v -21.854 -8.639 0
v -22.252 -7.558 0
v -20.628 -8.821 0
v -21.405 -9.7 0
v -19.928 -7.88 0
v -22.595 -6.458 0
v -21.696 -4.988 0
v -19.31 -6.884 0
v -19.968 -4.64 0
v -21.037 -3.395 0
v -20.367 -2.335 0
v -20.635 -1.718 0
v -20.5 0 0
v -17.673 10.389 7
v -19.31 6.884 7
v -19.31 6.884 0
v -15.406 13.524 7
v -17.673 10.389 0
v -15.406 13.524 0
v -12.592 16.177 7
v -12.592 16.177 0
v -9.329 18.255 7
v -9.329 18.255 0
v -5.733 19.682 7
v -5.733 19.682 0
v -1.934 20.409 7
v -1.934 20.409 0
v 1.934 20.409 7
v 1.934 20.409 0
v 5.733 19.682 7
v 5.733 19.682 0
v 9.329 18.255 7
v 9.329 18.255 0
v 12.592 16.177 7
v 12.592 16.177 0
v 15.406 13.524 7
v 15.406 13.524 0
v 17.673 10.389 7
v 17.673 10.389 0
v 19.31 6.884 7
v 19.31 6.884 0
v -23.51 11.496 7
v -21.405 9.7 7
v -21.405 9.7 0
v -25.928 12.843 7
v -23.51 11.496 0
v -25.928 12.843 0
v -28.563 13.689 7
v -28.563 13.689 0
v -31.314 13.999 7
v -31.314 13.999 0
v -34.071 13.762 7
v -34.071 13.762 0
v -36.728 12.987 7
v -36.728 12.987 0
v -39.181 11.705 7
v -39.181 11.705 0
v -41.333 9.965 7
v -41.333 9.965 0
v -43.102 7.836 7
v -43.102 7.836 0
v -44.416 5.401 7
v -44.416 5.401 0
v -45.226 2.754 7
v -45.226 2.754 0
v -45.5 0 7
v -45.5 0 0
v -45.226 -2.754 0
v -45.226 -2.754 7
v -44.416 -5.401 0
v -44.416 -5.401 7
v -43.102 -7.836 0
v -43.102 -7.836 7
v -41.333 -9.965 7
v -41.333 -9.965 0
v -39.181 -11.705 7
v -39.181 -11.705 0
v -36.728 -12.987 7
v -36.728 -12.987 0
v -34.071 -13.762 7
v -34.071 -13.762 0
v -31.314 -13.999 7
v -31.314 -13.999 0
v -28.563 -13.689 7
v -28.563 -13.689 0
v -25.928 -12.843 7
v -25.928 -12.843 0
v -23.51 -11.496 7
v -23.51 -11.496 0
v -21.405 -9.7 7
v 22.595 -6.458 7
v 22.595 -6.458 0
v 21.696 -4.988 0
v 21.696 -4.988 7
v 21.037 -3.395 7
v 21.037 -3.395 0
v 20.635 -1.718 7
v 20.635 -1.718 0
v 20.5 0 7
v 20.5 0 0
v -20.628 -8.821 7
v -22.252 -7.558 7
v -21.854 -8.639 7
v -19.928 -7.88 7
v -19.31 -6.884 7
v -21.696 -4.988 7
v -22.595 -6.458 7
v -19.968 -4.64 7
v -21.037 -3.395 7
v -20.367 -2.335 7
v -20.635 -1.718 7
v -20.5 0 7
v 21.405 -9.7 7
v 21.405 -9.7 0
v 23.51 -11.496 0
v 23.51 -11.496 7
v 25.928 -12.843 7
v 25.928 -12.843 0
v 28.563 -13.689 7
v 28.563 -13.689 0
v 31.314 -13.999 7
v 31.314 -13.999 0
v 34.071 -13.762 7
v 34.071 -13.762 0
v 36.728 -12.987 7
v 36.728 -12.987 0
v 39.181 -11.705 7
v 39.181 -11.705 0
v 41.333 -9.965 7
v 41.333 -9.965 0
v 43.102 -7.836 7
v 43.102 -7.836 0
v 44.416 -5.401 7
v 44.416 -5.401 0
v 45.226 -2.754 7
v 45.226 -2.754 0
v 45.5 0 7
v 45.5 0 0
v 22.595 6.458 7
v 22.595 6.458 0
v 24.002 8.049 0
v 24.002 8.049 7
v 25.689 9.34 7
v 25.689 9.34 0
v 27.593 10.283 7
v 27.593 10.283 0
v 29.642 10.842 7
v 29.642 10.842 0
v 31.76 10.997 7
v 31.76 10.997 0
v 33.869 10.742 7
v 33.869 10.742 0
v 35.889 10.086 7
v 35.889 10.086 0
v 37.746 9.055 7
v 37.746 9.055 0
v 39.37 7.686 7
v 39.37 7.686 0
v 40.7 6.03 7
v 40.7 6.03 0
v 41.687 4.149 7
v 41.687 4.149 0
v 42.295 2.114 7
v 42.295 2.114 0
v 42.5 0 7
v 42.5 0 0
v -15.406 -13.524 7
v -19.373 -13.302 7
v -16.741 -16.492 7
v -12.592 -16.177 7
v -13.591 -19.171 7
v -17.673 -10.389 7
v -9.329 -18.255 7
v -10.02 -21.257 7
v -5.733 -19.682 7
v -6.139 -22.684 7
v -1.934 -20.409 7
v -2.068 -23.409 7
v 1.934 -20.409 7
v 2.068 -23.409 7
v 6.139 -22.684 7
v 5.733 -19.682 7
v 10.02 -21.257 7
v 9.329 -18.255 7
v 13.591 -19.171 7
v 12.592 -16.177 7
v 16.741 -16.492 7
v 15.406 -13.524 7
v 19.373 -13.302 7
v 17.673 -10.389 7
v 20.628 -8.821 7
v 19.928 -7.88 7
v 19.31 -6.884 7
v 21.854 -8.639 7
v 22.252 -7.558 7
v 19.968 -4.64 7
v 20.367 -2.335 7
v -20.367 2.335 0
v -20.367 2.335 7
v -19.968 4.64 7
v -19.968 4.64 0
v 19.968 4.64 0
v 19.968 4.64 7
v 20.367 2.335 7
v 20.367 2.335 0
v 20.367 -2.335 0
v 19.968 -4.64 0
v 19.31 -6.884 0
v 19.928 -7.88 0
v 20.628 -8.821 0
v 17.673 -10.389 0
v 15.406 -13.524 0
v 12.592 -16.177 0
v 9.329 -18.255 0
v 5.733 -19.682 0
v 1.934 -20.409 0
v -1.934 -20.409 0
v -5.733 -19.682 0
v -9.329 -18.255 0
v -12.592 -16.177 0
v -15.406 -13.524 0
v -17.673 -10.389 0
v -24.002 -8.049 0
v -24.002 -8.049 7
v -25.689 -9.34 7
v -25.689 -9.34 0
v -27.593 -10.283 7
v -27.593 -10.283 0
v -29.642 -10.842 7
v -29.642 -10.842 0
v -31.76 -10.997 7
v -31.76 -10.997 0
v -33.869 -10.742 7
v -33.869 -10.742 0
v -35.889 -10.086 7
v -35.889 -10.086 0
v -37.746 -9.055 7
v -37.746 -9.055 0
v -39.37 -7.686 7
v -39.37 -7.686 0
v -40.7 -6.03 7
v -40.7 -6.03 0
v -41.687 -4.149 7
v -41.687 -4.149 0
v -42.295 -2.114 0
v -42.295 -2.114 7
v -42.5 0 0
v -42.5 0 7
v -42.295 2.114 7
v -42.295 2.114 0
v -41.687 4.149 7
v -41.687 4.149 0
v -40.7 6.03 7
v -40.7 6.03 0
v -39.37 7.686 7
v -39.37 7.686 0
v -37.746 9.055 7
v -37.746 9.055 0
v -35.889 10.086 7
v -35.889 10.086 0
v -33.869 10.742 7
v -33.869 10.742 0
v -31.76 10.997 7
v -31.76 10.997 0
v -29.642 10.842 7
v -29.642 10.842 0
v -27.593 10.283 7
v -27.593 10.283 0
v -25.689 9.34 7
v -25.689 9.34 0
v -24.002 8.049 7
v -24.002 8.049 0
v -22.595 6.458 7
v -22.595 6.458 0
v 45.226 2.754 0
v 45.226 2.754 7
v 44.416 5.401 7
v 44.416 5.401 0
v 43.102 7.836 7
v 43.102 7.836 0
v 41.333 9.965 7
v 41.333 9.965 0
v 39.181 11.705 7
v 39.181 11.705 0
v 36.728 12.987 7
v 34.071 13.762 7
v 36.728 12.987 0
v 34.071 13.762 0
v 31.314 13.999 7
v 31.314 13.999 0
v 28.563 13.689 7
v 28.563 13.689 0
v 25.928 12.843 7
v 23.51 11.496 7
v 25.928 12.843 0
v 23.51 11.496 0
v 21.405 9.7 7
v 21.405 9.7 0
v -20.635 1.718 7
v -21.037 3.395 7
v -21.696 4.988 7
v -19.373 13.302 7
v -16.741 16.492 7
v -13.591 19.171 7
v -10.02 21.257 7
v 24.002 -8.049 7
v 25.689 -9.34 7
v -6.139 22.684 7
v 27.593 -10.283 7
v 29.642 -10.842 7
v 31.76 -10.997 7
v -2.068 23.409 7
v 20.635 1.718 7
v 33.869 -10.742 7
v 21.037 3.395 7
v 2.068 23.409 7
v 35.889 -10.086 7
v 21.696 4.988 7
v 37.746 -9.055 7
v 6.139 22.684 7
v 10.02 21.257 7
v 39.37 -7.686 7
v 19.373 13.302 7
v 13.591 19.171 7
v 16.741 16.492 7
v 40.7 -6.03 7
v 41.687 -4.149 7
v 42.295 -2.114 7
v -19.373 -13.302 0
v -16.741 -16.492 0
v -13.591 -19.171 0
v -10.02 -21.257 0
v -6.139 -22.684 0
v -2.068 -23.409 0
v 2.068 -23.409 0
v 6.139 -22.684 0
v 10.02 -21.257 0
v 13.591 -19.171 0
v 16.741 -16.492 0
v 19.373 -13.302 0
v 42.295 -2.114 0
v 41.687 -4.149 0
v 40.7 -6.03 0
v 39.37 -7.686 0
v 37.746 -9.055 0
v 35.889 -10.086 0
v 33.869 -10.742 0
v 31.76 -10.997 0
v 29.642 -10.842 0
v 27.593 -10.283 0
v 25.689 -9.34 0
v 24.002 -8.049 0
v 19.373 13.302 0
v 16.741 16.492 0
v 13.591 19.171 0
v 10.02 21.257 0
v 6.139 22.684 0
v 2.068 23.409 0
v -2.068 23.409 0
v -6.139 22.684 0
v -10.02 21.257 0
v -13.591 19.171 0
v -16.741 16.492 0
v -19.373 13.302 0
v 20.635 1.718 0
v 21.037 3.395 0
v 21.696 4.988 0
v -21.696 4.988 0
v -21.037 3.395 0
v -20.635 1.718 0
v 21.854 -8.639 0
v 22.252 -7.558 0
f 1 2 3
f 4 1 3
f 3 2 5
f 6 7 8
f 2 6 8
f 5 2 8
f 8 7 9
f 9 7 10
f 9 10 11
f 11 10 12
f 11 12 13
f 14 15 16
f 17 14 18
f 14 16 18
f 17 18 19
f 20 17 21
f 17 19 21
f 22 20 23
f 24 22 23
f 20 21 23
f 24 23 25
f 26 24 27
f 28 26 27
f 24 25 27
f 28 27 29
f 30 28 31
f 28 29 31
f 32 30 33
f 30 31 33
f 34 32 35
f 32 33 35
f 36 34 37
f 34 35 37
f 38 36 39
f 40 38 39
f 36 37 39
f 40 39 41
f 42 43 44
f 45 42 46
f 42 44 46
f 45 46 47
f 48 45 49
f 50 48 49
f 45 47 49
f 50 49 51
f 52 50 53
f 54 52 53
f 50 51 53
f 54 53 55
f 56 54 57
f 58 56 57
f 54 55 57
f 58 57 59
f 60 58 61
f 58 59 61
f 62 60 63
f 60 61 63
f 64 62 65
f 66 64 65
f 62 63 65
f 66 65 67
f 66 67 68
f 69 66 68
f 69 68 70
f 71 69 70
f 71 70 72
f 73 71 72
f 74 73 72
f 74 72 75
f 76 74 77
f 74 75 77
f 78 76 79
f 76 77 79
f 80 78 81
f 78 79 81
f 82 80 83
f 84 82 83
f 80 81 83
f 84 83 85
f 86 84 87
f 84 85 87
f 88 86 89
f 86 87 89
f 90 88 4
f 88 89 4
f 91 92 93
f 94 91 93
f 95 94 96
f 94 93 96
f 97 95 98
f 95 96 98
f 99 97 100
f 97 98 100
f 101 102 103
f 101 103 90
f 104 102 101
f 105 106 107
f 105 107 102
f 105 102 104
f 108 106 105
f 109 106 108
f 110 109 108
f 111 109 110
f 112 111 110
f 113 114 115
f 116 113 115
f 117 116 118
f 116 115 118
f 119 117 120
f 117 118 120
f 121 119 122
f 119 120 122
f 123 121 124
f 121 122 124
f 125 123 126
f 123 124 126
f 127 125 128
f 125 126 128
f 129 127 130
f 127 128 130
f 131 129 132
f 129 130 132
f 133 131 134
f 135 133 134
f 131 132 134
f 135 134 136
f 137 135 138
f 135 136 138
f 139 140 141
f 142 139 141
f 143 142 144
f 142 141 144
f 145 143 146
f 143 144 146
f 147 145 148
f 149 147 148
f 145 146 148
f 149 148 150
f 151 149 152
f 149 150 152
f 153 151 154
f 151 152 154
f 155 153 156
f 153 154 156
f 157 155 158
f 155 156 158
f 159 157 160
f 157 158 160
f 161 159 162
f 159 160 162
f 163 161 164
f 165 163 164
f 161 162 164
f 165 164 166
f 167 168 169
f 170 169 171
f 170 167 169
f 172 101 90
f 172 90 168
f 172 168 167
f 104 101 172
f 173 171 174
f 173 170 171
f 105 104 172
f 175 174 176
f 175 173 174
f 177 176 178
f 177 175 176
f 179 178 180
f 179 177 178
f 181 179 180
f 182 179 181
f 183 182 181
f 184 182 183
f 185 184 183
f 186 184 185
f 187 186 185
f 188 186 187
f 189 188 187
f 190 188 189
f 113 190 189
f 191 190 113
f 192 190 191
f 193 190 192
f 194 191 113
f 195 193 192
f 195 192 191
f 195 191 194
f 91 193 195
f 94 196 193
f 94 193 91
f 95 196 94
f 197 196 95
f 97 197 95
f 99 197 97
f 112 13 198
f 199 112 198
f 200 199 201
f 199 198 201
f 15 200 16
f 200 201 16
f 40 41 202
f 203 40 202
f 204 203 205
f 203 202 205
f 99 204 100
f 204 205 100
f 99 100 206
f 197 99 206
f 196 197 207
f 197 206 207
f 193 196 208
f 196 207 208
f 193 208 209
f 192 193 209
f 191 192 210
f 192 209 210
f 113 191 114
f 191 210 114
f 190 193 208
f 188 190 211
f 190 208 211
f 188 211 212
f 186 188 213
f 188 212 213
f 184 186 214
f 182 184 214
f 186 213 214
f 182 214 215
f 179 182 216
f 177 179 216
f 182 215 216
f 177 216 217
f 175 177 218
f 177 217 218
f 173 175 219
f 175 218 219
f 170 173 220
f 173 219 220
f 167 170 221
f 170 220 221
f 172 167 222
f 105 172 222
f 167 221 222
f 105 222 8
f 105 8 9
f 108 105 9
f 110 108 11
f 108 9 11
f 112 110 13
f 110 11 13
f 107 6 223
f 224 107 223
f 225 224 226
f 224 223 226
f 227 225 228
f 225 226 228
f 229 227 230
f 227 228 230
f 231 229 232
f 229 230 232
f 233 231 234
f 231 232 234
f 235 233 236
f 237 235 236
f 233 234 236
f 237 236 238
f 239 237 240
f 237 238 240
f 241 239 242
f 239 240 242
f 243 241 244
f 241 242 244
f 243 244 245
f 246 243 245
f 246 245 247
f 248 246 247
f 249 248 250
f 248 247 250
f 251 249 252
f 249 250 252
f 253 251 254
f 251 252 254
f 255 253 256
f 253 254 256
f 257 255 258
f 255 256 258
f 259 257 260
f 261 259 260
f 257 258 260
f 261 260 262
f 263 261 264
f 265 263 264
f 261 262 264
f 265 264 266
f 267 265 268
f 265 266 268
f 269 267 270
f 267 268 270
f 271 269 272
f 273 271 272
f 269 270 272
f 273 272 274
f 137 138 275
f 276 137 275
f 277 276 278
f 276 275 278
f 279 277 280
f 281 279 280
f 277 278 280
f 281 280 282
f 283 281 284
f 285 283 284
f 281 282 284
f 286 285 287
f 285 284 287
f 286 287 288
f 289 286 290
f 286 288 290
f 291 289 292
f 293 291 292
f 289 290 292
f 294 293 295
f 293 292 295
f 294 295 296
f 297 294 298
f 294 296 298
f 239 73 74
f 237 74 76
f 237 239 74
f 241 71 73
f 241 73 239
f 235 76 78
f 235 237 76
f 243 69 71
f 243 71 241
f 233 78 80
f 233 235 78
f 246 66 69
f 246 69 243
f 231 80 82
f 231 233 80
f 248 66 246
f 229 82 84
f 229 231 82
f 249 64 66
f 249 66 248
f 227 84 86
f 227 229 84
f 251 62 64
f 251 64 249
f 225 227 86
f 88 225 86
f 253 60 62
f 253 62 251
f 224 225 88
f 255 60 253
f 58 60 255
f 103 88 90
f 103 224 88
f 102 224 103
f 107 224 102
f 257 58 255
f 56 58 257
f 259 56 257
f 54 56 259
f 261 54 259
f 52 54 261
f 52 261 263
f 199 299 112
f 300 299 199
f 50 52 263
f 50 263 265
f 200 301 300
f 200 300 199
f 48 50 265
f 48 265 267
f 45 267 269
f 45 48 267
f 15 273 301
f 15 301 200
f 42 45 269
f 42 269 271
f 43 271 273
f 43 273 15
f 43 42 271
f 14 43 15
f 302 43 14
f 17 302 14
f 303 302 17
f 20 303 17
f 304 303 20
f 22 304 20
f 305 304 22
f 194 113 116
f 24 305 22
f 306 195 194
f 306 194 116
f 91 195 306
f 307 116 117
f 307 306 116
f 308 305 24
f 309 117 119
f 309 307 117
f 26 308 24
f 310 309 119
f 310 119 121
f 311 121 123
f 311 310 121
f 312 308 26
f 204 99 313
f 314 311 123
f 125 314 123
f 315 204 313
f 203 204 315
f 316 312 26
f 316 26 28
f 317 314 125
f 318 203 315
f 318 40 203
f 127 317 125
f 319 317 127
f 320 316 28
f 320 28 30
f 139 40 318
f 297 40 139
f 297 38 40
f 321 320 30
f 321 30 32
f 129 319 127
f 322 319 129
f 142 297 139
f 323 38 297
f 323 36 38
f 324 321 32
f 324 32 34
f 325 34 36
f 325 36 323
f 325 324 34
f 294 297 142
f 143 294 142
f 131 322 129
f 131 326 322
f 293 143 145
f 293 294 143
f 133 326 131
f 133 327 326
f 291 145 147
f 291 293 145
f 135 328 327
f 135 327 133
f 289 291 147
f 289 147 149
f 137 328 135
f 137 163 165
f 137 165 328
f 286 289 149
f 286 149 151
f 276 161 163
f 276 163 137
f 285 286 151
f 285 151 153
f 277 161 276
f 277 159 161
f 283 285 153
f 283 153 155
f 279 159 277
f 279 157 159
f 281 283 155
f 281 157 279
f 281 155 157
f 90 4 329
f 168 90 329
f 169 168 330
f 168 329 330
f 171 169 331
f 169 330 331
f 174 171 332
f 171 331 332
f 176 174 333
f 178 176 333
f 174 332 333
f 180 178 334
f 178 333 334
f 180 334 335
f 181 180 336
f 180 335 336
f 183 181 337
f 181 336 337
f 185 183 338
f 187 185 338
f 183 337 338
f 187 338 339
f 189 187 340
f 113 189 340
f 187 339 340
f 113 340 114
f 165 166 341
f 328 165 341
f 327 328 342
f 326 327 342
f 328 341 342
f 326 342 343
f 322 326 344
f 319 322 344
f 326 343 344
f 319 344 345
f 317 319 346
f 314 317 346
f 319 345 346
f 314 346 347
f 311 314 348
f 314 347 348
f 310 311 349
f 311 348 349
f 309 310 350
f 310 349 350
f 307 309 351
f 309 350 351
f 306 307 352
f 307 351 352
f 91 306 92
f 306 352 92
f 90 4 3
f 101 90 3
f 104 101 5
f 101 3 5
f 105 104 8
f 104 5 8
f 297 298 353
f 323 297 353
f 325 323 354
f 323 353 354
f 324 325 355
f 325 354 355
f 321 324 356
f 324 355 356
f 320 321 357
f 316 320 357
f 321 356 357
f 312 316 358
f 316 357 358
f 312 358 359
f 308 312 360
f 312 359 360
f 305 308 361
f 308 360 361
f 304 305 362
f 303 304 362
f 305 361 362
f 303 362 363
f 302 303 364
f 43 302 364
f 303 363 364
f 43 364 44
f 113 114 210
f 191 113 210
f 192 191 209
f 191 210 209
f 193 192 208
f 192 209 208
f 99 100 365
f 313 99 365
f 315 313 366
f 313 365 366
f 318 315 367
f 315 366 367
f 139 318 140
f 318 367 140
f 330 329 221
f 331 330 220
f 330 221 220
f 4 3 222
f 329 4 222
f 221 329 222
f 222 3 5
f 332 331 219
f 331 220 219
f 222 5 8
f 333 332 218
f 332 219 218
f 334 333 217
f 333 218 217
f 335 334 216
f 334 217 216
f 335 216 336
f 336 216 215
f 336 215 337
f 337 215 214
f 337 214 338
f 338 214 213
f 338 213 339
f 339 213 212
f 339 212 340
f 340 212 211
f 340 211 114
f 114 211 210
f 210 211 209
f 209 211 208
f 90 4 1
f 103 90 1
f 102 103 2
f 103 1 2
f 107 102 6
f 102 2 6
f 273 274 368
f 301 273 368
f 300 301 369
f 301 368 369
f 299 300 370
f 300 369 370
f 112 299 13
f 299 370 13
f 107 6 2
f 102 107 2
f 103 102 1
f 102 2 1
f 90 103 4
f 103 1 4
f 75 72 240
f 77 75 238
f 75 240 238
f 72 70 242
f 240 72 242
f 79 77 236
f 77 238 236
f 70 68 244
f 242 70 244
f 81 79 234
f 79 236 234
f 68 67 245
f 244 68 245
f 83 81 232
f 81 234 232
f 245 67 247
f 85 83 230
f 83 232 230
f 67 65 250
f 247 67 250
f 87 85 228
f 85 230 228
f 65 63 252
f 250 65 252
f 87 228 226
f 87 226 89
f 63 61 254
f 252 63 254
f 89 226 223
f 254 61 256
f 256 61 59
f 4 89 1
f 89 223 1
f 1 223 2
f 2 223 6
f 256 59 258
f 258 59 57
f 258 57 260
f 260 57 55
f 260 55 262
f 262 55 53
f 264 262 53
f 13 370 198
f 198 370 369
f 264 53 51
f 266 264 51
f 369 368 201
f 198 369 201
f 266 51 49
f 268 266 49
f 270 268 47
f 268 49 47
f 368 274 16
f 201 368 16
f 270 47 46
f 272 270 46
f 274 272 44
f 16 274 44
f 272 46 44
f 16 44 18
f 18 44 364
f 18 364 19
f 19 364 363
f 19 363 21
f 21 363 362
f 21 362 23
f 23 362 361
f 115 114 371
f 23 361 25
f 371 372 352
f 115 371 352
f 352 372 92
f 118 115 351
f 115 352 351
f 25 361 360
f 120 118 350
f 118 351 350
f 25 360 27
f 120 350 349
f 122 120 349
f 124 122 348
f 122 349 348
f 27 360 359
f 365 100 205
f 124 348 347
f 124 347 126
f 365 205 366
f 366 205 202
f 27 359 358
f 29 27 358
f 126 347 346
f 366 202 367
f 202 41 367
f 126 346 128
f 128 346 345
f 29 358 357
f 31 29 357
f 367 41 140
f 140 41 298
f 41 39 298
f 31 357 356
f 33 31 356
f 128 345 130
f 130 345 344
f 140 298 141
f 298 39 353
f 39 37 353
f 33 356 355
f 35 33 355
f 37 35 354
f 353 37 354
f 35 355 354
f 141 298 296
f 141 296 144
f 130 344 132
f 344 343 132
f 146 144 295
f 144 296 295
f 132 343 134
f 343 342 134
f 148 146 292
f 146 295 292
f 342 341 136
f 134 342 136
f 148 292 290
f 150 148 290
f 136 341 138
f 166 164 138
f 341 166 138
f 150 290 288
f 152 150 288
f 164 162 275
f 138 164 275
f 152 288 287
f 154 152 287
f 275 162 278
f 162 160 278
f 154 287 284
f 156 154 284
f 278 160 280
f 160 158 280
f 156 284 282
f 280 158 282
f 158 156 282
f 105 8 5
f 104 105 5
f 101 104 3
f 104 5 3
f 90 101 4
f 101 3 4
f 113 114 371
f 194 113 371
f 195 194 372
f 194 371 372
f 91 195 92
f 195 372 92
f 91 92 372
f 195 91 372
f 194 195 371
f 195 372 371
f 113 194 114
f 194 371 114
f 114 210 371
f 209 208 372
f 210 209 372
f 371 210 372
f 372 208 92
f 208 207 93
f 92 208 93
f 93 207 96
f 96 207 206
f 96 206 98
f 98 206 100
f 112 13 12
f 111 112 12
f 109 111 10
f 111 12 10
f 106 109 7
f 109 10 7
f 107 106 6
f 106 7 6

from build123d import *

# Parameters (mm, degrees)
F1_DEPTH = 7
F3_DEPTH = 7


with BuildPart() as f1:
    # F0 (on Top) → F1 (new body)
    with BuildSketch(Plane.XY):
        with BuildLine():
            ThreePointArc((-22.5952380952, 6.4579575269), (-22.0596325818, 8.1007783795), (-21.4047619048, 9.6998024619))
            ThreePointArc((-21.4047619048, 9.6998024619), (-45.5, 0), (-21.4047619048, -9.6998024619))
            ThreePointArc((-21.4047619048, -9.6998024619), (-22.0596325818, -8.1007783795), (-22.5952380952, -6.4579575269))
            ThreePointArc((-22.5952380952, -6.4579575269), (-42.5, 0), (-22.5952380952, 6.4579575269))
        make_face()
        with BuildLine():
            ThreePointArc((-19.3095238095, 6.8842058547), (0, 20.5), (19.3095238095, 6.8842058547))
            ThreePointArc((19.3095238095, 6.8842058547), (20.2685636996, 8.3579207121), (21.4047619048, 9.6998024619))
            ThreePointArc((21.4047619048, 9.6998024619), (0, 23.5), (-21.4047619048, 9.6998024619))
            ThreePointArc((-21.4047619048, 9.6998024619), (-20.2685636996, 8.3579207121), (-19.3095238095, 6.8842058547))
        make_face()
        with BuildLine():
            ThreePointArc((21.4047619048, 9.6998024619), (22.0596325818, 8.1007783795), (22.5952380952, 6.4579575269))
            ThreePointArc((22.5952380952, 6.4579575269), (34.8946736992, 10.4630870433), (42.5, 0))
            ThreePointArc((42.5, 0), (34.8946736992, -10.4630870433), (22.5952380952, -6.4579575269))
            ThreePointArc((22.5952380952, -6.4579575269), (22.0596325818, -8.1007783795), (21.4047619048, -9.6998024619))
            ThreePointArc((21.4047619048, -9.6998024619), (36.7281290471, -12.9871731592), (45.5, 0))
            ThreePointArc((45.5, 0), (36.7281290471, 12.9871731592), (21.4047619048, 9.6998024619))
        make_face()
        with BuildLine():
            ThreePointArc((-20.5, 0), (-20.2001885894, 3.493190655), (-19.3095238095, 6.8842058547))
            ThreePointArc((-19.3095238095, 6.8842058547), (-20.2685636996, 8.3579207121), (-21.4047619048, 9.6998024619))
            ThreePointArc((-21.4047619048, 9.6998024619), (-22.0596325818, 8.1007783795), (-22.5952380952, 6.4579575269))
            ThreePointArc((-22.5952380952, 6.4579575269), (-21.0369129567, 3.3946736992), (-20.5, 0))
        make_face()
        with BuildLine():
            ThreePointArc((19.3095238095, 6.8842058547), (20.2001885894, 3.493190655), (20.5, 0))
            ThreePointArc((20.5, 0), (21.0369129567, 3.3946736992), (22.5952380952, 6.4579575269))
            ThreePointArc((22.5952380952, 6.4579575269), (22.0596325818, 8.1007783795), (21.4047619048, 9.6998024619))
            ThreePointArc((21.4047619048, 9.6998024619), (20.2685636996, 8.3579207121), (19.3095238095, 6.8842058547))
        make_face()
    extrude(amount=F1_DEPTH)


with BuildPart() as f1b:
    # F0 (on Top) → F1, piece 2 (new body)
    with BuildSketch(Plane.XY):
        with BuildLine():
            ThreePointArc((21.4047619048, -9.6998024619), (20.2685636996, -8.3579207121), (19.3095238095, -6.8842058547))
            ThreePointArc((19.3095238095, -6.8842058547), (0, -20.5), (-19.3095238095, -6.8842058547))
            ThreePointArc((-19.3095238095, -6.8842058547), (-20.2685636996, -8.3579207121), (-21.4047619048, -9.6998024619))
            ThreePointArc((-21.4047619048, -9.6998024619), (0, -23.5), (21.4047619048, -9.6998024619))
        make_face()
    extrude(amount=F1_DEPTH)


with BuildPart() as f3:
    # F2 (on Top) → F3 (new body)
    with BuildSketch(Plane.XY):
        with BuildLine():
            ThreePointArc((-21.4047619048, -9.6998024619), (-20.2685636996, -8.3579207121), (-19.3095238095, -6.8842058547))
            ThreePointArc((-19.3095238095, -6.8842058547), (-20.2001885894, -3.493190655), (-20.5, 0))
            ThreePointArc((-20.5, 0), (-21.0369129567, -3.3946736992), (-22.5952380952, -6.4579575269))
            ThreePointArc((-22.5952380952, -6.4579575269), (-22.0596325818, -8.1007783795), (-21.4047619048, -9.6998024619))
        make_face()
    extrude(amount=F3_DEPTH)


with BuildPart() as f3b:
    # F2 (on Top) → F3, piece 2 (new body)
    with BuildSketch(Plane.XY):
        with BuildLine():
            ThreePointArc((22.5952380952, -6.4579575269), (21.0369129567, -3.3946736992), (20.5, 0))
            ThreePointArc((20.5, 0), (20.2001885894, -3.493190655), (19.3095238095, -6.8842058547))
            ThreePointArc((19.3095238095, -6.8842058547), (20.2685636996, -8.3579207121), (21.4047619048, -9.6998024619))
            ThreePointArc((21.4047619048, -9.6998024619), (22.0596325818, -8.1007783795), (22.5952380952, -6.4579575269))
        make_face()
    extrude(amount=F3_DEPTH)


solid = Compound([f1.part, f1b.part, f3.part, f3b.part])
